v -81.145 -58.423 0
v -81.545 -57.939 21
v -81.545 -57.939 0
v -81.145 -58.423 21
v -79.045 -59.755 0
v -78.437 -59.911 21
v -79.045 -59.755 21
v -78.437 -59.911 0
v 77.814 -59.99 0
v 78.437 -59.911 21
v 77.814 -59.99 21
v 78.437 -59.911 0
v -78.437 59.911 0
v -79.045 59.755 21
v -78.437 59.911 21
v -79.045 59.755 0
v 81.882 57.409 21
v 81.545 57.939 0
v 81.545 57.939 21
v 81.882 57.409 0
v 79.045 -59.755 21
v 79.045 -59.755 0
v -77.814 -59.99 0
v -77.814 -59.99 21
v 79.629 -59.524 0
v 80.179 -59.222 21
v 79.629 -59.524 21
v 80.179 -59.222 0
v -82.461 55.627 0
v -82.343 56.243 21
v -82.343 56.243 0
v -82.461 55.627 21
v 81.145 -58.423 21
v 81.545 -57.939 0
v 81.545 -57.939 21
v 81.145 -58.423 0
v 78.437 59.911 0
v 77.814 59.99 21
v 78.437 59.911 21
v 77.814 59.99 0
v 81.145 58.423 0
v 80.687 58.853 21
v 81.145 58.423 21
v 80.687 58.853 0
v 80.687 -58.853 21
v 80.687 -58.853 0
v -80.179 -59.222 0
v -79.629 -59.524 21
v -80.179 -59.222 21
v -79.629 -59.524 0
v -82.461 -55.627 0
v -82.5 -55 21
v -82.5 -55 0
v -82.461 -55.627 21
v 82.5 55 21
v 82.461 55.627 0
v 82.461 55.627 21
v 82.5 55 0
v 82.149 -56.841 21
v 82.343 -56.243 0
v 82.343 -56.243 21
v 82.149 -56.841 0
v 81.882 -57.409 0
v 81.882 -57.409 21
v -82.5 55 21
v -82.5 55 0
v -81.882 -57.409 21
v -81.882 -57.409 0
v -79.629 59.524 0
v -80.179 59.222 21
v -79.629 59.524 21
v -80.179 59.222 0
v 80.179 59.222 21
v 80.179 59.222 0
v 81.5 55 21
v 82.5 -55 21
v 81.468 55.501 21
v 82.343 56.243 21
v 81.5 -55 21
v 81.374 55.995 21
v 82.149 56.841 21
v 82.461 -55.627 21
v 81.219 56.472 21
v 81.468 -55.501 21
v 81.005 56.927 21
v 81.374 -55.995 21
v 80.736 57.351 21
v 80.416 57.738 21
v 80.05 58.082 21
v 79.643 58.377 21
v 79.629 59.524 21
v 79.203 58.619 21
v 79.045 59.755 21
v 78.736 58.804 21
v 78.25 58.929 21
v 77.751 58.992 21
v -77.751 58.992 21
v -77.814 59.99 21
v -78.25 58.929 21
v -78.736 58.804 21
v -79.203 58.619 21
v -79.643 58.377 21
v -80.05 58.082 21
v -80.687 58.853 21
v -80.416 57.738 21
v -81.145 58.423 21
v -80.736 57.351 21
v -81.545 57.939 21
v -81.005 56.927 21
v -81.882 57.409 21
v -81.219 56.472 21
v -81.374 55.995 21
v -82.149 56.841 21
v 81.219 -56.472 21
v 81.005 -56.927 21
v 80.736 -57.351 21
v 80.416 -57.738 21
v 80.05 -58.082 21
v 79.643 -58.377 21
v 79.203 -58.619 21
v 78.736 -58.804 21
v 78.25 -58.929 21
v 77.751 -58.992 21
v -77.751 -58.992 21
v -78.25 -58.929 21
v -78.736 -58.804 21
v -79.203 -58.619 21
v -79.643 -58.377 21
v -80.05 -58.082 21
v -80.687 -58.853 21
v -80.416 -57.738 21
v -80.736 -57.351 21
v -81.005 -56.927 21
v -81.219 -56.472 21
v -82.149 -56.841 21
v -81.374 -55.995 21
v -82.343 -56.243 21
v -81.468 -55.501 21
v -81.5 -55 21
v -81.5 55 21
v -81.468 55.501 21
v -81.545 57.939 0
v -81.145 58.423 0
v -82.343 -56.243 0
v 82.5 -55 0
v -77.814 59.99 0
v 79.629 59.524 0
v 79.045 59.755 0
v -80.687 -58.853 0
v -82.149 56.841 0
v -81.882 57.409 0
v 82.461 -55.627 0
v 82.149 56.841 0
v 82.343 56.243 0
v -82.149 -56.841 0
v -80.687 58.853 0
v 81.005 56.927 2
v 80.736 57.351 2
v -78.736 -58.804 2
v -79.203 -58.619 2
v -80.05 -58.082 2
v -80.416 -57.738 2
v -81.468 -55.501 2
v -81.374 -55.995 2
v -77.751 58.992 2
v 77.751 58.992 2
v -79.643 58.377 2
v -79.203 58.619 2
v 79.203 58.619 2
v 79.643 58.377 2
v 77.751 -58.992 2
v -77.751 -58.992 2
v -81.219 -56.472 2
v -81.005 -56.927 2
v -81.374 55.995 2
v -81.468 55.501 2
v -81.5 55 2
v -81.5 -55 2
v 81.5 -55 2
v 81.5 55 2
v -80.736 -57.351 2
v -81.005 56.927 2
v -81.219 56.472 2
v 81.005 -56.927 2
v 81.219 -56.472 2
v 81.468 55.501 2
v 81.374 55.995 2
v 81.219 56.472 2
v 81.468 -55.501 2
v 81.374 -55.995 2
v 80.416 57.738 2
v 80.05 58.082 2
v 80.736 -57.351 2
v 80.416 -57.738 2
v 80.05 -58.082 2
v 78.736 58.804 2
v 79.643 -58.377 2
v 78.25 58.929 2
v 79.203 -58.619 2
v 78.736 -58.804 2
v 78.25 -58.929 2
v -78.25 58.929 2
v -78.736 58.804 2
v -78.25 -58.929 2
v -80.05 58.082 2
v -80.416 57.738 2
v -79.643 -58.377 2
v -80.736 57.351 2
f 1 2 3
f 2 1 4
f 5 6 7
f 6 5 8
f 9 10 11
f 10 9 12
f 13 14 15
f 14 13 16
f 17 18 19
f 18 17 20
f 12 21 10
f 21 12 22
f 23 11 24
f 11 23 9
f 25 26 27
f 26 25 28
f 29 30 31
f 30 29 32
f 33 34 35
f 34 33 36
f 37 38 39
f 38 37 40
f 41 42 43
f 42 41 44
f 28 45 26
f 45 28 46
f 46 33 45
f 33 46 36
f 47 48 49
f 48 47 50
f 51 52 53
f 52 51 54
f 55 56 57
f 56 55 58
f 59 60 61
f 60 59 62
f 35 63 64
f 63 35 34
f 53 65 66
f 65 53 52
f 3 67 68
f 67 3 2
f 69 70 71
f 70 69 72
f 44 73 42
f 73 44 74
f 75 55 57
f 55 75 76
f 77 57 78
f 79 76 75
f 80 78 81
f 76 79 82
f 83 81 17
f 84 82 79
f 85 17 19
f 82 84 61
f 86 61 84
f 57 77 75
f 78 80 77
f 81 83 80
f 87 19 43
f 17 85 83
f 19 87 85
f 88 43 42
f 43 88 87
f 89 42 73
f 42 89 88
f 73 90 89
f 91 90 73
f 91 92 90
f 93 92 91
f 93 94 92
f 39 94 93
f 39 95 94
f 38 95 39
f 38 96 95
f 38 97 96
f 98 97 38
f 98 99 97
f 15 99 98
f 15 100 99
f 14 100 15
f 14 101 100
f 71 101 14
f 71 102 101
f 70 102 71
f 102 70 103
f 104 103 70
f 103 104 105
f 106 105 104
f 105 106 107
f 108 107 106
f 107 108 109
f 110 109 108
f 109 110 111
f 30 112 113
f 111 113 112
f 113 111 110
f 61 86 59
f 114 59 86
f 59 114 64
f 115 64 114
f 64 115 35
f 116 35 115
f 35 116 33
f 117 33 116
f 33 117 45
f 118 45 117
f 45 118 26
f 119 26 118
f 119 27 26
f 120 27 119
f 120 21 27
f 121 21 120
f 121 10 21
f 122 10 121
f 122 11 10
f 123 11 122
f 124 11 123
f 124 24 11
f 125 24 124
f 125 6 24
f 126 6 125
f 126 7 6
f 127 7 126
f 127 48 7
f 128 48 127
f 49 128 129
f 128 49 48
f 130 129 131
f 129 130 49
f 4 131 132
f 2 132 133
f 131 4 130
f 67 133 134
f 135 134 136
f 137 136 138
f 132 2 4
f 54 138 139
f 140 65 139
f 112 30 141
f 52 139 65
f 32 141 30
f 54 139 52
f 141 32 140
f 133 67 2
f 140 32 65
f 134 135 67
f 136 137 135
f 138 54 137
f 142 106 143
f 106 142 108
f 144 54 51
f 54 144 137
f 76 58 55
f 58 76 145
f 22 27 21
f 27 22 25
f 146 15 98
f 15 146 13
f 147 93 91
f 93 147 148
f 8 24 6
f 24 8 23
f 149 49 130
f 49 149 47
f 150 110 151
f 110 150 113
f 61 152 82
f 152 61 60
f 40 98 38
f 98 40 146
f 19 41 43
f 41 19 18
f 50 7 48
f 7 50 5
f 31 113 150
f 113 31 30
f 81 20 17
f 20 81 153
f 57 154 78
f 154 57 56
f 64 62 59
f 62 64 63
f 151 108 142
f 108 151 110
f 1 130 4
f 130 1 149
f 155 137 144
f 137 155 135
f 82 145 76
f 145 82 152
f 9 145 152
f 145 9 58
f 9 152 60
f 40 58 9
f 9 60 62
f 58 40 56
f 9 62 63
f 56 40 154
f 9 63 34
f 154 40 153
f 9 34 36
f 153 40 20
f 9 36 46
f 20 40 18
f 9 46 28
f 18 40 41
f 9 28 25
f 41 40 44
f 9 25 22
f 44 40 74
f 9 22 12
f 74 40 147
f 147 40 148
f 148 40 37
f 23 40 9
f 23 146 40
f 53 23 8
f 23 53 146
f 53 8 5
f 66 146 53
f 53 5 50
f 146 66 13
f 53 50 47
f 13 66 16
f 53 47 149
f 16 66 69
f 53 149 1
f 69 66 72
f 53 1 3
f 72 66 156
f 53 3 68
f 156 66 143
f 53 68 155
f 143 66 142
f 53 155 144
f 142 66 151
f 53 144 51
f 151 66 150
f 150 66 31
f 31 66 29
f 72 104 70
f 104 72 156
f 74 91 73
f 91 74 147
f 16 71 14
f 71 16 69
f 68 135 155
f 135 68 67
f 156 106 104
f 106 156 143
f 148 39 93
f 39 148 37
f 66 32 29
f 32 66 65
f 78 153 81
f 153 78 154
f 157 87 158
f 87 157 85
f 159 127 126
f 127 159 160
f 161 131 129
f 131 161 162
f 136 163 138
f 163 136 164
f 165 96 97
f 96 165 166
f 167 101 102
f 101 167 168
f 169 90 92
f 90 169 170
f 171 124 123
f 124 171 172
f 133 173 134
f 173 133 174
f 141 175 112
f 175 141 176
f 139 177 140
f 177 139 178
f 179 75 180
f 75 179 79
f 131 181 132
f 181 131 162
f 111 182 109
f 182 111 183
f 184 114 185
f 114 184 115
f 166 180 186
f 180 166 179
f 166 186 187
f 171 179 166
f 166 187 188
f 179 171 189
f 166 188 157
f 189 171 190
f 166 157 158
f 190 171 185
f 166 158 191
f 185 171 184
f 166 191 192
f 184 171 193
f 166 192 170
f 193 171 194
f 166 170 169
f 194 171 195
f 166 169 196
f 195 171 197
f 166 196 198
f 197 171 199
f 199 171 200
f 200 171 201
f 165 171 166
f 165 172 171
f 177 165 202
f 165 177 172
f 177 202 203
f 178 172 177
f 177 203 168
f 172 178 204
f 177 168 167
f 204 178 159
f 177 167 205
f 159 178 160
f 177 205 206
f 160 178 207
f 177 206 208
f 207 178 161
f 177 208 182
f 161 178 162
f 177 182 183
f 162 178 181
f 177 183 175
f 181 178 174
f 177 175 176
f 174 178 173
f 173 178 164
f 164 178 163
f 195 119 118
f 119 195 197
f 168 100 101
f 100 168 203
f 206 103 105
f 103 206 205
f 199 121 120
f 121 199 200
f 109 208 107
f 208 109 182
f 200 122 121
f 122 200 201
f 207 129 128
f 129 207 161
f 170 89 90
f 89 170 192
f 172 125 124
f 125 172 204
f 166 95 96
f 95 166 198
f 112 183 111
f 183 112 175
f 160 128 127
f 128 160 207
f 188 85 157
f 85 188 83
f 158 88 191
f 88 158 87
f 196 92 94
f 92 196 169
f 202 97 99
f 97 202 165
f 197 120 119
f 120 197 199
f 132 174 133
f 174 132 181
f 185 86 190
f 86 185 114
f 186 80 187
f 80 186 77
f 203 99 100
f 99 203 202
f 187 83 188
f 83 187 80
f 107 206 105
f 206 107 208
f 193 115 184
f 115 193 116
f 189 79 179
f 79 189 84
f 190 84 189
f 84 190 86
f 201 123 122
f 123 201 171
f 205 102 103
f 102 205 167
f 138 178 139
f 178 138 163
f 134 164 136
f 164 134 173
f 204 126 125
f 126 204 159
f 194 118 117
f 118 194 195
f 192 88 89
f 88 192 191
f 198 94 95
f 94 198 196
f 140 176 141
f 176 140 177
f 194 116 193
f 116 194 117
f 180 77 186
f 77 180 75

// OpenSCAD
$fn = 50;


difference() {
	union() {
		hull() {
			translate(v = [-77.5000000000, 55.0000000000, 0]) {
				cylinder(h = 21, r = 5);
			}
			translate(v = [77.5000000000, 55.0000000000, 0]) {
				cylinder(h = 21, r = 5);
			}
			translate(v = [-77.5000000000, -55.0000000000, 0]) {
				cylinder(h = 21, r = 5);
			}
			translate(v = [77.5000000000, -55.0000000000, 0]) {
				cylinder(h = 21, r = 5);
			}
		}
	}
	union() {
		translate(v = [0, 0, 2]) {
			hull() {
				translate(v = [-77.5000000000, 55.0000000000, 0]) {
					cylinder(h = 19, r = 4);
				}
				translate(v = [77.5000000000, 55.0000000000, 0]) {
					cylinder(h = 19, r = 4);
				}
				translate(v = [-77.5000000000, -55.0000000000, 0]) {
					cylinder(h = 19, r = 4);
				}
				translate(v = [77.5000000000, -55.0000000000, 0]) {
					cylinder(h = 19, r = 4);
				}
			}
		}
	}
}
